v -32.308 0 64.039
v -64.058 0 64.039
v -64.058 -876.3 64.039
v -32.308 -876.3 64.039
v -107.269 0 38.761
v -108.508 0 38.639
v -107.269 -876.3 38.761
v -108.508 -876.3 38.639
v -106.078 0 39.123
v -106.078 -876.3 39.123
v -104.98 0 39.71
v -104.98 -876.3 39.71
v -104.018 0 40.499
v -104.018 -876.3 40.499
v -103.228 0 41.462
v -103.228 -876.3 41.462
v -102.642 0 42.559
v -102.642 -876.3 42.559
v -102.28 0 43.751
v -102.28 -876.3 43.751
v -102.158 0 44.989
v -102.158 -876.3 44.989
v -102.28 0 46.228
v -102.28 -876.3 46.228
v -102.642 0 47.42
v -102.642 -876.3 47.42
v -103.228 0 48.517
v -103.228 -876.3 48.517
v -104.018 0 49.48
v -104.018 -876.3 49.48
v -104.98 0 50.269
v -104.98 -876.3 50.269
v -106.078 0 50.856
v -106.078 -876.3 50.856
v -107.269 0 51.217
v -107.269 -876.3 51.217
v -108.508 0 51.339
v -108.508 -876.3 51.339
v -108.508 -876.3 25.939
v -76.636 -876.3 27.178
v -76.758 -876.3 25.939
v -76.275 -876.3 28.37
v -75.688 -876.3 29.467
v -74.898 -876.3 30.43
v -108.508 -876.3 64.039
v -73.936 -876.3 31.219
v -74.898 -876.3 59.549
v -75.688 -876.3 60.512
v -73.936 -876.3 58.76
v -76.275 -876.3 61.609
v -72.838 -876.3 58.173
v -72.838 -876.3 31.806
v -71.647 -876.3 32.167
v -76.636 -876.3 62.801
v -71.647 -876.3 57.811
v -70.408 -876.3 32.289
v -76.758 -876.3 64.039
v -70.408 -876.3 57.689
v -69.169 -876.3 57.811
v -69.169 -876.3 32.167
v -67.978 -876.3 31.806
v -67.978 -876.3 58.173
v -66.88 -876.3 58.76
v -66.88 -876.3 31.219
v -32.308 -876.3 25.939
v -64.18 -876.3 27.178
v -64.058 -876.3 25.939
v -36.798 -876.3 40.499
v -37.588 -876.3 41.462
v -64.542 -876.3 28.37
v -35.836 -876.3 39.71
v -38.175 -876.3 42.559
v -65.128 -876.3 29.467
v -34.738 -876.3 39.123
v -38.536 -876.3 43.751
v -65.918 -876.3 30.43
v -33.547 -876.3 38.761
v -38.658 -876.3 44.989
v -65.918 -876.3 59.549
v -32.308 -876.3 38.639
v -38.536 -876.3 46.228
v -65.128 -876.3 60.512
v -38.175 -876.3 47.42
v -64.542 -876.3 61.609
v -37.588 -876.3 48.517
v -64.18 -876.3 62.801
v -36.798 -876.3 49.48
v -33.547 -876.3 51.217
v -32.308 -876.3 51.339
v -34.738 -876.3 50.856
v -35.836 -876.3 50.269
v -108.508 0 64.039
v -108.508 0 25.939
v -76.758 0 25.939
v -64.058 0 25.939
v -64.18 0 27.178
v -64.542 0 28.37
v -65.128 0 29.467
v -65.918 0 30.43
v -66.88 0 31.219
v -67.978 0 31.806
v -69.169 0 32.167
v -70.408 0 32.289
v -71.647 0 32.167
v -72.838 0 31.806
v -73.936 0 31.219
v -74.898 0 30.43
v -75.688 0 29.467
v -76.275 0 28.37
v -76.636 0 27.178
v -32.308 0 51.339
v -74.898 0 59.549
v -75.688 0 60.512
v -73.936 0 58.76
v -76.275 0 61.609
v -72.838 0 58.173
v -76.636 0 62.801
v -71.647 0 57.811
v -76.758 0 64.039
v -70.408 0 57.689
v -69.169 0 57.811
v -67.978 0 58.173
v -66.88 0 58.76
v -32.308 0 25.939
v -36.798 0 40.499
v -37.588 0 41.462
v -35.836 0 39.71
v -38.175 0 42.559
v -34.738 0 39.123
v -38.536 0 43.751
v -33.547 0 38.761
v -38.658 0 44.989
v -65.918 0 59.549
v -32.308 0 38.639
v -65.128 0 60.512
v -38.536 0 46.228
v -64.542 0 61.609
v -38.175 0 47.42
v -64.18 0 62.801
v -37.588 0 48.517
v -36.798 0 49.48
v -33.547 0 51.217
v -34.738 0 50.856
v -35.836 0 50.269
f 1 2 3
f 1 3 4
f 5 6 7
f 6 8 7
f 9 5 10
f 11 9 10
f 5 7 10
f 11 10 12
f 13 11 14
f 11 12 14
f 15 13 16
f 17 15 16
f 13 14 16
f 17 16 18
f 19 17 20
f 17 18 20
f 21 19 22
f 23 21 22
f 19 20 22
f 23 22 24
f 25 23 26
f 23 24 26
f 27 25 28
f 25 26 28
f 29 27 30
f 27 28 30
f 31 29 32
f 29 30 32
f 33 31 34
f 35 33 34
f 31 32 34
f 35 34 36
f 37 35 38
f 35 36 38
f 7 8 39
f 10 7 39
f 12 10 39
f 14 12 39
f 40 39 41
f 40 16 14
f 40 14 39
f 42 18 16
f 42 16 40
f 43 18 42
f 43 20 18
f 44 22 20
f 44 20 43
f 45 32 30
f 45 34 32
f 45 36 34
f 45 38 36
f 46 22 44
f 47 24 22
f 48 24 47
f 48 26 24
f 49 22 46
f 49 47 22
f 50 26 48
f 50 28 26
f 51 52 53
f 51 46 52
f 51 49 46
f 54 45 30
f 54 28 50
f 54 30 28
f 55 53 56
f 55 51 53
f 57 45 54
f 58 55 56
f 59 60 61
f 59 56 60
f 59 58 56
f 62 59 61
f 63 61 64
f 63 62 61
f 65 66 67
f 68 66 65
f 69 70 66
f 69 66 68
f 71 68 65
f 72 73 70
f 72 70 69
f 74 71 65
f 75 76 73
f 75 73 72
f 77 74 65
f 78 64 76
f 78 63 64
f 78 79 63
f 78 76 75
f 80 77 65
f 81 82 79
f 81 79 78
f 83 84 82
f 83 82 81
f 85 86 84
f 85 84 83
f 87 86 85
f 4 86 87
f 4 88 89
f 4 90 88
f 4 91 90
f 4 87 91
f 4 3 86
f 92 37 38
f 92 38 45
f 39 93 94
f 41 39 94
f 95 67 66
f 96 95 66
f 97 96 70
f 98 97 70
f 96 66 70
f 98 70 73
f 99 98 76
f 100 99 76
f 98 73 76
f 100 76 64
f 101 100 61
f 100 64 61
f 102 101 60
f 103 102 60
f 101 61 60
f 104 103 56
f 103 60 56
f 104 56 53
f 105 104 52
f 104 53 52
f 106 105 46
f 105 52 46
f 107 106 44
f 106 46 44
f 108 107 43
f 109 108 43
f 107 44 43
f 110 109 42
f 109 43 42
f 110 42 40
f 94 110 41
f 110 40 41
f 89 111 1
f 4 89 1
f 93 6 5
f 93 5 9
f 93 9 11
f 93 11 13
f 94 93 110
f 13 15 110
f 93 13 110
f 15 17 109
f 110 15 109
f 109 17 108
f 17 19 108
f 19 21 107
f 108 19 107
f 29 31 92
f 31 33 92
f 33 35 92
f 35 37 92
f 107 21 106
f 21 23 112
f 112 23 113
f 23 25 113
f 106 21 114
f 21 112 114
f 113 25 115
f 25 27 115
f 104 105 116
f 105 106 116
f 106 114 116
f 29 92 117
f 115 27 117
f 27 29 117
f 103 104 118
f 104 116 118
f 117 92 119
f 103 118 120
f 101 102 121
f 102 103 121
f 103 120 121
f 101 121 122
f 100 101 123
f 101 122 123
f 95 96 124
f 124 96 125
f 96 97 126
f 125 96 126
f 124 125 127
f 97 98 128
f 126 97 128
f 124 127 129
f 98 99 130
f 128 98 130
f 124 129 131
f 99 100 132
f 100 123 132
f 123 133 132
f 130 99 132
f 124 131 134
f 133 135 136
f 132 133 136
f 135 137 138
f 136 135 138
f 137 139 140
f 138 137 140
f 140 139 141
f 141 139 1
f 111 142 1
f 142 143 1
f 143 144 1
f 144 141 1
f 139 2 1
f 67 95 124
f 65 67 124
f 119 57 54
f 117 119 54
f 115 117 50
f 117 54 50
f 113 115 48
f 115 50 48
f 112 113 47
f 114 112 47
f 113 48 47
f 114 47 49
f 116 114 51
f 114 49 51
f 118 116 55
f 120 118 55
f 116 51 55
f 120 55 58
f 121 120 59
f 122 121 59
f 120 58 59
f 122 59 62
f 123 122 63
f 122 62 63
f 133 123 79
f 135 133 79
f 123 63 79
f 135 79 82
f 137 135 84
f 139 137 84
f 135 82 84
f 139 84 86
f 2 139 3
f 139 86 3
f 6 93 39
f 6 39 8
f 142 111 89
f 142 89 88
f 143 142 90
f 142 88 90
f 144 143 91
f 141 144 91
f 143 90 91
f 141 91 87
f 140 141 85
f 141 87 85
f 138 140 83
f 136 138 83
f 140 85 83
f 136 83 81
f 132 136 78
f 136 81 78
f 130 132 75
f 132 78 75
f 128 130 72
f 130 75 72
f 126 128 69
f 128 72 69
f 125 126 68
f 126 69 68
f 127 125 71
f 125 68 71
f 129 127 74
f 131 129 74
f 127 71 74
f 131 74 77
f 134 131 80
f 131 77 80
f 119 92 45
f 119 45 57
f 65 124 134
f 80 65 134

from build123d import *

# Parameters (mm, degrees)
F0_W     = 76.2
F0_H     = 38.1
F1_DEPTH = 876.3
F2_R     = 6.35
F3_DEPTH = 876.3
F4_R     = 6.35
F5_DEPTH = 876.3


with BuildPart() as f1:
    # F0 (on Front) → F1 (new body)
    with BuildSketch(Plane.XZ):
        with Locations((-70.408251, 44.989463)):
            Rectangle(F0_W, F0_H)
    extrude(amount=F1_DEPTH)

    # F2 (on face) → F3 (cut)
    with BuildSketch(Plane.XZ.offset(876.3)):
        with Locations((-70.408251, 64.039463)):
            Circle(F2_R)
    extrude(amount=-F3_DEPTH, mode=Mode.SUBTRACT)

    # F4 (on face) → F5 (cut)
    with BuildSketch(Plane.XZ.offset(876.3)):
        with Locations((-32.308251, 44.989463)):
            Circle(F4_R)
        with Locations((-108.508251, 44.989463)):
            Circle(F4_R)
        with Locations((-70.408251, 25.939463)):
            Circle(F4_R)
    extrude(amount=-F5_DEPTH, mode=Mode.SUBTRACT)


solid = f1.part
